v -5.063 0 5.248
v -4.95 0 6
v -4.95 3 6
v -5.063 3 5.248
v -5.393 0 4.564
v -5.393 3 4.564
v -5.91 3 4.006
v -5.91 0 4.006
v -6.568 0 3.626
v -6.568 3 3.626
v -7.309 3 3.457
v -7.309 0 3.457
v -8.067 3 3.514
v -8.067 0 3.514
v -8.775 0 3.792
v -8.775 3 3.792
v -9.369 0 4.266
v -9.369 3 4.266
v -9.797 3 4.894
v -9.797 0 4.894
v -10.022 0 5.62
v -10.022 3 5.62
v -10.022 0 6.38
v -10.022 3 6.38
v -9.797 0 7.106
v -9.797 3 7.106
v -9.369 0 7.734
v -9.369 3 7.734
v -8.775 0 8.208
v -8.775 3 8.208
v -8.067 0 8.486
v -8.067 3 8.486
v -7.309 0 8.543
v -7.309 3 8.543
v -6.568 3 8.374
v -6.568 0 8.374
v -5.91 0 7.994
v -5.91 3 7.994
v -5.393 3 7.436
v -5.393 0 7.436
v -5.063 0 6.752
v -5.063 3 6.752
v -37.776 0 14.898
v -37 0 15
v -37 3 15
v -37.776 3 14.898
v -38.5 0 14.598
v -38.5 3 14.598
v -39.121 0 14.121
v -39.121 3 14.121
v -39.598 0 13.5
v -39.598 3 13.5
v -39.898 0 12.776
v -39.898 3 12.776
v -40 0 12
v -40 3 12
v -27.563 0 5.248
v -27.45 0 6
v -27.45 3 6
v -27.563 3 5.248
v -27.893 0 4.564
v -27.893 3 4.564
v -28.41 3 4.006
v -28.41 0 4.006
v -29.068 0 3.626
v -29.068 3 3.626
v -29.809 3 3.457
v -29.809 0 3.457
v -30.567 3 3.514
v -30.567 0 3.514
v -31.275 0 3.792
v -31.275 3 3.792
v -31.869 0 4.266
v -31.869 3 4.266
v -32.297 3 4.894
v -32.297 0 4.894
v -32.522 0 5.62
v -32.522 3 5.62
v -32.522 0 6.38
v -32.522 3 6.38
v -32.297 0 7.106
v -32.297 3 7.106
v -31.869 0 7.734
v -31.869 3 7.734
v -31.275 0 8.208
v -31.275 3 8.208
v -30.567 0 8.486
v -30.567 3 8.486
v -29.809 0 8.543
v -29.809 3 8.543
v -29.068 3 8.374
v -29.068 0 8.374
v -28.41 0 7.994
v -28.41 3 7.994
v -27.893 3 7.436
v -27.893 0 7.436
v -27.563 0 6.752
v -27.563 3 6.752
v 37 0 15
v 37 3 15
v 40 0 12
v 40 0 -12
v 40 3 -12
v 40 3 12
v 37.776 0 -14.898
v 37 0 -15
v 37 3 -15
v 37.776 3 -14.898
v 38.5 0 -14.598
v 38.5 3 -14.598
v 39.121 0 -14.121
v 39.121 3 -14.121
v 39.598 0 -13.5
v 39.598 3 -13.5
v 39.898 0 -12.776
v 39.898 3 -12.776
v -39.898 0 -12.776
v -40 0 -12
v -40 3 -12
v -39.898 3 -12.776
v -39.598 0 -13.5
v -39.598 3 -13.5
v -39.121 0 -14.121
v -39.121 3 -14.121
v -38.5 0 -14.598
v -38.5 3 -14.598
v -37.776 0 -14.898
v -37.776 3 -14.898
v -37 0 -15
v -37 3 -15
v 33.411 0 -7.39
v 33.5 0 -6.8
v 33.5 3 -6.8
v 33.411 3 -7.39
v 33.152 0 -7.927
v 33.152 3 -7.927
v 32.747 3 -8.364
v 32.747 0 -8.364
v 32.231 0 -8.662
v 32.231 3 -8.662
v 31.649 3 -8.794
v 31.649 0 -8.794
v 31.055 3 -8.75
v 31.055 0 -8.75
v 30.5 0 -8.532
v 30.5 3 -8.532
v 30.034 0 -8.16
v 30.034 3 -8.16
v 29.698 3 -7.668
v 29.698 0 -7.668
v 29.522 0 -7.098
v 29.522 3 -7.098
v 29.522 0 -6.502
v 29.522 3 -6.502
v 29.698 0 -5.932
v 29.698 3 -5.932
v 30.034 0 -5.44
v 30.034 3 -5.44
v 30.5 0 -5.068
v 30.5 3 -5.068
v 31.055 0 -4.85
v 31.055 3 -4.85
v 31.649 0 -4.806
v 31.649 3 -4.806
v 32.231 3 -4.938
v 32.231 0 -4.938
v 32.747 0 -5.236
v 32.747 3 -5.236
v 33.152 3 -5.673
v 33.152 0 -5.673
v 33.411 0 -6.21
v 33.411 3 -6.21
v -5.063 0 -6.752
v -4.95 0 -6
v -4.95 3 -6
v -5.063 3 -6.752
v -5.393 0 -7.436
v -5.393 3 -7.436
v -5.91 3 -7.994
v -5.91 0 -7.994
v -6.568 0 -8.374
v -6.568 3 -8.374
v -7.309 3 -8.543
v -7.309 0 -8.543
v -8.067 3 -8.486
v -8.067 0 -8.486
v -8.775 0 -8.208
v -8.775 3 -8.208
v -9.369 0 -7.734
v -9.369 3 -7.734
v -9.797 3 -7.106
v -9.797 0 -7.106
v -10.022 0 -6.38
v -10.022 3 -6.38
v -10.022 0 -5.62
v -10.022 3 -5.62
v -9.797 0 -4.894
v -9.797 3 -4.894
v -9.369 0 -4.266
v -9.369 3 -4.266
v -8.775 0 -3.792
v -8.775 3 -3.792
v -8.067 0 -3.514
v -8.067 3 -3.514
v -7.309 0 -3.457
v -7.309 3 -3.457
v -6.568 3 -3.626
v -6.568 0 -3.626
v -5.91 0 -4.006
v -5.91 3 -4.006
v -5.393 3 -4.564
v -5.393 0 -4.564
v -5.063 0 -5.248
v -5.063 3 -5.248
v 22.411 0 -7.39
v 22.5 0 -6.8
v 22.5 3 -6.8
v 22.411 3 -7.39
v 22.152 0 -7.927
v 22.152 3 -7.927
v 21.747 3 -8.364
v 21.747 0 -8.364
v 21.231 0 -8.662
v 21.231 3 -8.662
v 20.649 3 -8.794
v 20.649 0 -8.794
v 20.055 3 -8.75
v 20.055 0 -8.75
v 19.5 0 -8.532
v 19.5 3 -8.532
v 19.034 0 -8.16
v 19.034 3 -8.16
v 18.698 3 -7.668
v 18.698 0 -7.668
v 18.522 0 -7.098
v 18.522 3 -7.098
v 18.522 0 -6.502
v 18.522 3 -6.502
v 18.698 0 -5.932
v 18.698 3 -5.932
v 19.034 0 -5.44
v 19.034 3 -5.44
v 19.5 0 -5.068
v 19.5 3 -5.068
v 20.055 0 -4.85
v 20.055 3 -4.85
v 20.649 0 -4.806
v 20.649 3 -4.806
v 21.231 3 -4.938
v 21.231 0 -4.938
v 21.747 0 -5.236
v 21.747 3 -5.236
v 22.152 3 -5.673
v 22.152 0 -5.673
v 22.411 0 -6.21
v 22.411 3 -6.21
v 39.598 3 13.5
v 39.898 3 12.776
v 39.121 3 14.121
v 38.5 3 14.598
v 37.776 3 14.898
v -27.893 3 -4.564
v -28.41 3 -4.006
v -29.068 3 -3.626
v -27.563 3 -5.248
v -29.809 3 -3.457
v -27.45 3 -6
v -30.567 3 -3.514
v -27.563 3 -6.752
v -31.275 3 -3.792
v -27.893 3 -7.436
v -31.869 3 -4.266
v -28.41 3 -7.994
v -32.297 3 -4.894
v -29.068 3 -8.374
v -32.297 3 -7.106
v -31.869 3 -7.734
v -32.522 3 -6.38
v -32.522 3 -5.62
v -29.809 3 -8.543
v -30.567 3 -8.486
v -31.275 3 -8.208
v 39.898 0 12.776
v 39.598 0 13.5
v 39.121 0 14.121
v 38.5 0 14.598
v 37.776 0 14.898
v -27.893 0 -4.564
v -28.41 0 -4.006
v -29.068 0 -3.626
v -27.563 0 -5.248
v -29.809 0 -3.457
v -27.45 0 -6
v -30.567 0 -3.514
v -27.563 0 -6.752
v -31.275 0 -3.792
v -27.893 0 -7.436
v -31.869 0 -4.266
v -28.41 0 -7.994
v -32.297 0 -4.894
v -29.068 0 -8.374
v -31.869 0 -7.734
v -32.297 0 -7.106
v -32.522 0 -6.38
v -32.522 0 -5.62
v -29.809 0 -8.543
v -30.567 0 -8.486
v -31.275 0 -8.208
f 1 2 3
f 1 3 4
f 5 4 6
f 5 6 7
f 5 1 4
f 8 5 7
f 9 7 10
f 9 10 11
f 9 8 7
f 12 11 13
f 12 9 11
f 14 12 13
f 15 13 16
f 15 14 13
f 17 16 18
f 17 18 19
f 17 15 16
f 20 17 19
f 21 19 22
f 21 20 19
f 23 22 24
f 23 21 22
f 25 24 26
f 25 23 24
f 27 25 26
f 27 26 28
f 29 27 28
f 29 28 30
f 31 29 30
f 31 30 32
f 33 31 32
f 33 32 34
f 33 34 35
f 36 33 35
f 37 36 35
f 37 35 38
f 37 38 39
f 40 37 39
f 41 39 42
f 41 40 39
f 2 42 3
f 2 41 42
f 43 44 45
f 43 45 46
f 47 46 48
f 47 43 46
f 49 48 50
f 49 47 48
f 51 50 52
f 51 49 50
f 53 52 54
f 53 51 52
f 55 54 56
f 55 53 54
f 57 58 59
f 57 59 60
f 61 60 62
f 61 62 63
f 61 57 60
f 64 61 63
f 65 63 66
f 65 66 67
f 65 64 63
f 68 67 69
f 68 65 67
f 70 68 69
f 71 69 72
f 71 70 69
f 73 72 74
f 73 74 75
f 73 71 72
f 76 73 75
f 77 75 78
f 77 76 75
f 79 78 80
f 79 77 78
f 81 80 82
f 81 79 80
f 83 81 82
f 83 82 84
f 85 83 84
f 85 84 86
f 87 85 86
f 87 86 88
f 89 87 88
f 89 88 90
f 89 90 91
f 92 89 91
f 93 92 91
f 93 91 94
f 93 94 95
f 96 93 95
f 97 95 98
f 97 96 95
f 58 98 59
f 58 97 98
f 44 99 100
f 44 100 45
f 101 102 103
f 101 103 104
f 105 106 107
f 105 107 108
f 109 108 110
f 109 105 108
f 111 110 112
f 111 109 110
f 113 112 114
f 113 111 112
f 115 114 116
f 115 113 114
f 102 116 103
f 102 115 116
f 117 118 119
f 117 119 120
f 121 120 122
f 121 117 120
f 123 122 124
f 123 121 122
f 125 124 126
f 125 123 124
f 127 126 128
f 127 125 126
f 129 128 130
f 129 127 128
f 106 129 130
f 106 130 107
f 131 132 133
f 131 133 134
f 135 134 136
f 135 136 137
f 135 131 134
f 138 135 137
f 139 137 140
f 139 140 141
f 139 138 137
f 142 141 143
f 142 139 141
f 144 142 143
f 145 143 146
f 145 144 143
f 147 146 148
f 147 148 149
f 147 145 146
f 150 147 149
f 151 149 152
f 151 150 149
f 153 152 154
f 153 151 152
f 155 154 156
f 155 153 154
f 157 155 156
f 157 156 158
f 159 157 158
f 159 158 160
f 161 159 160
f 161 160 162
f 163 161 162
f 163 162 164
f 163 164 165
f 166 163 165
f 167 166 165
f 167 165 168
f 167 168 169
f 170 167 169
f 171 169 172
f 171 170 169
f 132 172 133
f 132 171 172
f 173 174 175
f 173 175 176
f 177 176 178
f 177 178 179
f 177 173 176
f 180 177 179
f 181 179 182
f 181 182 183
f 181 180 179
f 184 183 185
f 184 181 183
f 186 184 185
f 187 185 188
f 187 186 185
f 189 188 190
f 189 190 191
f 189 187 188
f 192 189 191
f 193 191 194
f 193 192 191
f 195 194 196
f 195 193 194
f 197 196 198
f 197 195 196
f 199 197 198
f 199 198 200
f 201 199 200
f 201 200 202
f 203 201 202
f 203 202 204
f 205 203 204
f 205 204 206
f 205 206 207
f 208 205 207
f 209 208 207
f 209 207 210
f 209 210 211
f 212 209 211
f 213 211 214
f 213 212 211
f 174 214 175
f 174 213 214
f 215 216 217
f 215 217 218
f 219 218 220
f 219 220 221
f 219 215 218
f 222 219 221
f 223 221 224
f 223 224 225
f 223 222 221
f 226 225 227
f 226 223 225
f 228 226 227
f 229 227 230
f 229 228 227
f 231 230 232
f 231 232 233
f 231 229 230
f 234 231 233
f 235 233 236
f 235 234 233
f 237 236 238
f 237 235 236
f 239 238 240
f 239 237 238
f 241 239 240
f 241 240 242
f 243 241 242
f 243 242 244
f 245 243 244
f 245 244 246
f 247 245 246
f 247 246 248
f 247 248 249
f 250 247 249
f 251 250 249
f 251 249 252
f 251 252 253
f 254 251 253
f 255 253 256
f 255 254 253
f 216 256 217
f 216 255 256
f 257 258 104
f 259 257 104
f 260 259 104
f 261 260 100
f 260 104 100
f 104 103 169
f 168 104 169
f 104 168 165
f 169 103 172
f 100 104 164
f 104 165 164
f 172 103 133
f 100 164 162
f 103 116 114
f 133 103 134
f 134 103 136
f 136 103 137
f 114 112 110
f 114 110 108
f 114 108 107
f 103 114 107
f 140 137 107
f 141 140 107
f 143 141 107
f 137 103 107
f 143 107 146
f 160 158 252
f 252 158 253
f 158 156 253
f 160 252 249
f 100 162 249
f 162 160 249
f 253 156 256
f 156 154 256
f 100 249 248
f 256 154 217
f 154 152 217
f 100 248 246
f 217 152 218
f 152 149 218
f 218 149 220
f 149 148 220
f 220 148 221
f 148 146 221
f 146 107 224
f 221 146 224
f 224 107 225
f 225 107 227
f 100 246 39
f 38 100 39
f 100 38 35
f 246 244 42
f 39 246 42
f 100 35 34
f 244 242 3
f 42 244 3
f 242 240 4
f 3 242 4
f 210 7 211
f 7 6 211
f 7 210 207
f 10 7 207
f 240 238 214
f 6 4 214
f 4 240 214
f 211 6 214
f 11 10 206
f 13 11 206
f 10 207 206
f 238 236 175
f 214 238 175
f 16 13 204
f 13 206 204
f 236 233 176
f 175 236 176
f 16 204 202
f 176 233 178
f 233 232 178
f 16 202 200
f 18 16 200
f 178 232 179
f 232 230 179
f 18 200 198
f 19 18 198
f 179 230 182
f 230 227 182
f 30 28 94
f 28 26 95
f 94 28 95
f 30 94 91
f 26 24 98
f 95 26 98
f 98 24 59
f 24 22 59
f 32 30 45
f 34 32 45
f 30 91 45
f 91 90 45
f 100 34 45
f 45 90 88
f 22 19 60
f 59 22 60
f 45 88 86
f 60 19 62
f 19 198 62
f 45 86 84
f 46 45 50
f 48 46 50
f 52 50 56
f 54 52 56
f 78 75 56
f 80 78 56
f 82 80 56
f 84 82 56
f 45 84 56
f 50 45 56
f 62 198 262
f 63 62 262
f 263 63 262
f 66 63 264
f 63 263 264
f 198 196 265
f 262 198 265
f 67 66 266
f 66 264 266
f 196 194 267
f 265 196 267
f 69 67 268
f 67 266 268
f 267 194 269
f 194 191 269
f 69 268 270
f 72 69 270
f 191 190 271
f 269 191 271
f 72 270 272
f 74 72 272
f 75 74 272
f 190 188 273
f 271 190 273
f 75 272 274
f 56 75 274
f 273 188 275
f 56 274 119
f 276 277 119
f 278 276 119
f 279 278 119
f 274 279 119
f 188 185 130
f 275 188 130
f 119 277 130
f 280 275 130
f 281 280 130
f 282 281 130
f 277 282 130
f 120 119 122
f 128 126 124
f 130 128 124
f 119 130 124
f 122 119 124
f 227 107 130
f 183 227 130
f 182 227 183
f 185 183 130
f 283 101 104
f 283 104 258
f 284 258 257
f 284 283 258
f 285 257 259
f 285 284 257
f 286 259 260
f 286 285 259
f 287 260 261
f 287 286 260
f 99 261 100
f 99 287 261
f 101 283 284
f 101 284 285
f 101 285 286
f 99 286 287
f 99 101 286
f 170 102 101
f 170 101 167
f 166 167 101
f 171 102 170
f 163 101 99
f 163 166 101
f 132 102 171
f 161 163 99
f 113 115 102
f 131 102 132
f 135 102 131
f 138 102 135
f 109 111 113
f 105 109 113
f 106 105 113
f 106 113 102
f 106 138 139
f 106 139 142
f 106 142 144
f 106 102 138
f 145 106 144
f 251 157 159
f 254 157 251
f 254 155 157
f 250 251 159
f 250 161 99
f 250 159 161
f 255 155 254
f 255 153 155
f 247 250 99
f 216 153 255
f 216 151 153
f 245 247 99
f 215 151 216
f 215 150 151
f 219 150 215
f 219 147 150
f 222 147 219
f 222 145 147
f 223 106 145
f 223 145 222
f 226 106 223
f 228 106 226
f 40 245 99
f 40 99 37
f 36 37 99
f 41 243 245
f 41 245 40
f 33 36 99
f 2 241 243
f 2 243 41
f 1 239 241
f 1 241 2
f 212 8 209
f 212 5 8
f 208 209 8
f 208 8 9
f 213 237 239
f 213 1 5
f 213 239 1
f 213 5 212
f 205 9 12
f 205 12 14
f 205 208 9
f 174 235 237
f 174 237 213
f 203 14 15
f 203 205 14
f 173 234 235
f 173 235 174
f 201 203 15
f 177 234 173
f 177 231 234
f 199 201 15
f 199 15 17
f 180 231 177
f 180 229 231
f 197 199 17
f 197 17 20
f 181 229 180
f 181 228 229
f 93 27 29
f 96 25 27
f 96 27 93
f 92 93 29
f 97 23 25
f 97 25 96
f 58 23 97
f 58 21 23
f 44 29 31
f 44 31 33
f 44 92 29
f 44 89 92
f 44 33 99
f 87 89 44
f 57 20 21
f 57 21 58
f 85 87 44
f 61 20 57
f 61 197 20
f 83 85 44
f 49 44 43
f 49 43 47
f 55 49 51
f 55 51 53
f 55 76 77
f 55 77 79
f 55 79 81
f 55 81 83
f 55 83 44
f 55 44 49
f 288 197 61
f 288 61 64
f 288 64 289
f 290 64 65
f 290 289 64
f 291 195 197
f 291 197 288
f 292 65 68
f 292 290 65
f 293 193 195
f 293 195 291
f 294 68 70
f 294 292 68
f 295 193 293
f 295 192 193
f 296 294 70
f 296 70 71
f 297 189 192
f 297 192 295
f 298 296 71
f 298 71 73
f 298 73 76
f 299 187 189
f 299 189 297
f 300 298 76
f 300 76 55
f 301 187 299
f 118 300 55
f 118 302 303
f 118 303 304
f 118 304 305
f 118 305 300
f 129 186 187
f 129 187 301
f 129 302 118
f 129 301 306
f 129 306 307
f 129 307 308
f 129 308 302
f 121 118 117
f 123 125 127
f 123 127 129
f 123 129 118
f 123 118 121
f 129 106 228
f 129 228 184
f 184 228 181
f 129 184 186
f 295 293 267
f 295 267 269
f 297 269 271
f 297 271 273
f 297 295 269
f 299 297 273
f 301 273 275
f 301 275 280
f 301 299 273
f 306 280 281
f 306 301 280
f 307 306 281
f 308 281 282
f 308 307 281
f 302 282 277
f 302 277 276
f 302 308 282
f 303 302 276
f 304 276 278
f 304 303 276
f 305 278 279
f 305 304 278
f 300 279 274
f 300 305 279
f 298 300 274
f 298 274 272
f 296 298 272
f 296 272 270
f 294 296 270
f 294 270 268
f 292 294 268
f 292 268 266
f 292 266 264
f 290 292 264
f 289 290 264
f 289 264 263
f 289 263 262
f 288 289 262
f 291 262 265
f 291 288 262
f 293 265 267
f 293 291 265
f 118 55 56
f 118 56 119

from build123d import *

# Parameters (mm, degrees)
SKETCH1_R           = 2
SKETCH1_R_2         = 2.55
BOSS_EXTRUDE2_DEPTH = 3


with BuildPart() as part:
    # Sketch1 → Boss-Extrude2 (new body)
    with BuildSketch(Plane(origin=(0, 0, 0), x_dir=(1, 0, 0), z_dir=(0, 1, 0))):
        with BuildLine():
            Line((-37, 15), (37, 15))
            ThreePointArc((37, 15), (39.121320344, 14.121320344), (40, 12))
            Line((40, 12), (40, -12))
            ThreePointArc((40, -12), (39.121320344, -14.121320344), (37, -15))
            Line((37, -15), (-37, -15))
            ThreePointArc((-37, -15), (-39.121320344, -14.121320344), (-40, -12))
            Line((-40, -12), (-40, 12))
            ThreePointArc((-40, 12), (-39.121320344, 14.121320344), (-37, 15))
        make_face()
        with Locations((20.5, 6.8)):
            Circle(SKETCH1_R, mode=Mode.SUBTRACT)
        with Locations((31.5, 6.8)):
            Circle(SKETCH1_R, mode=Mode.SUBTRACT)
        with Locations((-30, 6)):
            Circle(SKETCH1_R_2, mode=Mode.SUBTRACT)
        with Locations((-30, -6)):
            Circle(SKETCH1_R_2, mode=Mode.SUBTRACT)
        with Locations((-7.5, 6)):
            Circle(SKETCH1_R_2, mode=Mode.SUBTRACT)
        with Locations((-7.5, -6)):
            Circle(SKETCH1_R_2, mode=Mode.SUBTRACT)
    extrude(amount=BOSS_EXTRUDE2_DEPTH)


solid = part.part
